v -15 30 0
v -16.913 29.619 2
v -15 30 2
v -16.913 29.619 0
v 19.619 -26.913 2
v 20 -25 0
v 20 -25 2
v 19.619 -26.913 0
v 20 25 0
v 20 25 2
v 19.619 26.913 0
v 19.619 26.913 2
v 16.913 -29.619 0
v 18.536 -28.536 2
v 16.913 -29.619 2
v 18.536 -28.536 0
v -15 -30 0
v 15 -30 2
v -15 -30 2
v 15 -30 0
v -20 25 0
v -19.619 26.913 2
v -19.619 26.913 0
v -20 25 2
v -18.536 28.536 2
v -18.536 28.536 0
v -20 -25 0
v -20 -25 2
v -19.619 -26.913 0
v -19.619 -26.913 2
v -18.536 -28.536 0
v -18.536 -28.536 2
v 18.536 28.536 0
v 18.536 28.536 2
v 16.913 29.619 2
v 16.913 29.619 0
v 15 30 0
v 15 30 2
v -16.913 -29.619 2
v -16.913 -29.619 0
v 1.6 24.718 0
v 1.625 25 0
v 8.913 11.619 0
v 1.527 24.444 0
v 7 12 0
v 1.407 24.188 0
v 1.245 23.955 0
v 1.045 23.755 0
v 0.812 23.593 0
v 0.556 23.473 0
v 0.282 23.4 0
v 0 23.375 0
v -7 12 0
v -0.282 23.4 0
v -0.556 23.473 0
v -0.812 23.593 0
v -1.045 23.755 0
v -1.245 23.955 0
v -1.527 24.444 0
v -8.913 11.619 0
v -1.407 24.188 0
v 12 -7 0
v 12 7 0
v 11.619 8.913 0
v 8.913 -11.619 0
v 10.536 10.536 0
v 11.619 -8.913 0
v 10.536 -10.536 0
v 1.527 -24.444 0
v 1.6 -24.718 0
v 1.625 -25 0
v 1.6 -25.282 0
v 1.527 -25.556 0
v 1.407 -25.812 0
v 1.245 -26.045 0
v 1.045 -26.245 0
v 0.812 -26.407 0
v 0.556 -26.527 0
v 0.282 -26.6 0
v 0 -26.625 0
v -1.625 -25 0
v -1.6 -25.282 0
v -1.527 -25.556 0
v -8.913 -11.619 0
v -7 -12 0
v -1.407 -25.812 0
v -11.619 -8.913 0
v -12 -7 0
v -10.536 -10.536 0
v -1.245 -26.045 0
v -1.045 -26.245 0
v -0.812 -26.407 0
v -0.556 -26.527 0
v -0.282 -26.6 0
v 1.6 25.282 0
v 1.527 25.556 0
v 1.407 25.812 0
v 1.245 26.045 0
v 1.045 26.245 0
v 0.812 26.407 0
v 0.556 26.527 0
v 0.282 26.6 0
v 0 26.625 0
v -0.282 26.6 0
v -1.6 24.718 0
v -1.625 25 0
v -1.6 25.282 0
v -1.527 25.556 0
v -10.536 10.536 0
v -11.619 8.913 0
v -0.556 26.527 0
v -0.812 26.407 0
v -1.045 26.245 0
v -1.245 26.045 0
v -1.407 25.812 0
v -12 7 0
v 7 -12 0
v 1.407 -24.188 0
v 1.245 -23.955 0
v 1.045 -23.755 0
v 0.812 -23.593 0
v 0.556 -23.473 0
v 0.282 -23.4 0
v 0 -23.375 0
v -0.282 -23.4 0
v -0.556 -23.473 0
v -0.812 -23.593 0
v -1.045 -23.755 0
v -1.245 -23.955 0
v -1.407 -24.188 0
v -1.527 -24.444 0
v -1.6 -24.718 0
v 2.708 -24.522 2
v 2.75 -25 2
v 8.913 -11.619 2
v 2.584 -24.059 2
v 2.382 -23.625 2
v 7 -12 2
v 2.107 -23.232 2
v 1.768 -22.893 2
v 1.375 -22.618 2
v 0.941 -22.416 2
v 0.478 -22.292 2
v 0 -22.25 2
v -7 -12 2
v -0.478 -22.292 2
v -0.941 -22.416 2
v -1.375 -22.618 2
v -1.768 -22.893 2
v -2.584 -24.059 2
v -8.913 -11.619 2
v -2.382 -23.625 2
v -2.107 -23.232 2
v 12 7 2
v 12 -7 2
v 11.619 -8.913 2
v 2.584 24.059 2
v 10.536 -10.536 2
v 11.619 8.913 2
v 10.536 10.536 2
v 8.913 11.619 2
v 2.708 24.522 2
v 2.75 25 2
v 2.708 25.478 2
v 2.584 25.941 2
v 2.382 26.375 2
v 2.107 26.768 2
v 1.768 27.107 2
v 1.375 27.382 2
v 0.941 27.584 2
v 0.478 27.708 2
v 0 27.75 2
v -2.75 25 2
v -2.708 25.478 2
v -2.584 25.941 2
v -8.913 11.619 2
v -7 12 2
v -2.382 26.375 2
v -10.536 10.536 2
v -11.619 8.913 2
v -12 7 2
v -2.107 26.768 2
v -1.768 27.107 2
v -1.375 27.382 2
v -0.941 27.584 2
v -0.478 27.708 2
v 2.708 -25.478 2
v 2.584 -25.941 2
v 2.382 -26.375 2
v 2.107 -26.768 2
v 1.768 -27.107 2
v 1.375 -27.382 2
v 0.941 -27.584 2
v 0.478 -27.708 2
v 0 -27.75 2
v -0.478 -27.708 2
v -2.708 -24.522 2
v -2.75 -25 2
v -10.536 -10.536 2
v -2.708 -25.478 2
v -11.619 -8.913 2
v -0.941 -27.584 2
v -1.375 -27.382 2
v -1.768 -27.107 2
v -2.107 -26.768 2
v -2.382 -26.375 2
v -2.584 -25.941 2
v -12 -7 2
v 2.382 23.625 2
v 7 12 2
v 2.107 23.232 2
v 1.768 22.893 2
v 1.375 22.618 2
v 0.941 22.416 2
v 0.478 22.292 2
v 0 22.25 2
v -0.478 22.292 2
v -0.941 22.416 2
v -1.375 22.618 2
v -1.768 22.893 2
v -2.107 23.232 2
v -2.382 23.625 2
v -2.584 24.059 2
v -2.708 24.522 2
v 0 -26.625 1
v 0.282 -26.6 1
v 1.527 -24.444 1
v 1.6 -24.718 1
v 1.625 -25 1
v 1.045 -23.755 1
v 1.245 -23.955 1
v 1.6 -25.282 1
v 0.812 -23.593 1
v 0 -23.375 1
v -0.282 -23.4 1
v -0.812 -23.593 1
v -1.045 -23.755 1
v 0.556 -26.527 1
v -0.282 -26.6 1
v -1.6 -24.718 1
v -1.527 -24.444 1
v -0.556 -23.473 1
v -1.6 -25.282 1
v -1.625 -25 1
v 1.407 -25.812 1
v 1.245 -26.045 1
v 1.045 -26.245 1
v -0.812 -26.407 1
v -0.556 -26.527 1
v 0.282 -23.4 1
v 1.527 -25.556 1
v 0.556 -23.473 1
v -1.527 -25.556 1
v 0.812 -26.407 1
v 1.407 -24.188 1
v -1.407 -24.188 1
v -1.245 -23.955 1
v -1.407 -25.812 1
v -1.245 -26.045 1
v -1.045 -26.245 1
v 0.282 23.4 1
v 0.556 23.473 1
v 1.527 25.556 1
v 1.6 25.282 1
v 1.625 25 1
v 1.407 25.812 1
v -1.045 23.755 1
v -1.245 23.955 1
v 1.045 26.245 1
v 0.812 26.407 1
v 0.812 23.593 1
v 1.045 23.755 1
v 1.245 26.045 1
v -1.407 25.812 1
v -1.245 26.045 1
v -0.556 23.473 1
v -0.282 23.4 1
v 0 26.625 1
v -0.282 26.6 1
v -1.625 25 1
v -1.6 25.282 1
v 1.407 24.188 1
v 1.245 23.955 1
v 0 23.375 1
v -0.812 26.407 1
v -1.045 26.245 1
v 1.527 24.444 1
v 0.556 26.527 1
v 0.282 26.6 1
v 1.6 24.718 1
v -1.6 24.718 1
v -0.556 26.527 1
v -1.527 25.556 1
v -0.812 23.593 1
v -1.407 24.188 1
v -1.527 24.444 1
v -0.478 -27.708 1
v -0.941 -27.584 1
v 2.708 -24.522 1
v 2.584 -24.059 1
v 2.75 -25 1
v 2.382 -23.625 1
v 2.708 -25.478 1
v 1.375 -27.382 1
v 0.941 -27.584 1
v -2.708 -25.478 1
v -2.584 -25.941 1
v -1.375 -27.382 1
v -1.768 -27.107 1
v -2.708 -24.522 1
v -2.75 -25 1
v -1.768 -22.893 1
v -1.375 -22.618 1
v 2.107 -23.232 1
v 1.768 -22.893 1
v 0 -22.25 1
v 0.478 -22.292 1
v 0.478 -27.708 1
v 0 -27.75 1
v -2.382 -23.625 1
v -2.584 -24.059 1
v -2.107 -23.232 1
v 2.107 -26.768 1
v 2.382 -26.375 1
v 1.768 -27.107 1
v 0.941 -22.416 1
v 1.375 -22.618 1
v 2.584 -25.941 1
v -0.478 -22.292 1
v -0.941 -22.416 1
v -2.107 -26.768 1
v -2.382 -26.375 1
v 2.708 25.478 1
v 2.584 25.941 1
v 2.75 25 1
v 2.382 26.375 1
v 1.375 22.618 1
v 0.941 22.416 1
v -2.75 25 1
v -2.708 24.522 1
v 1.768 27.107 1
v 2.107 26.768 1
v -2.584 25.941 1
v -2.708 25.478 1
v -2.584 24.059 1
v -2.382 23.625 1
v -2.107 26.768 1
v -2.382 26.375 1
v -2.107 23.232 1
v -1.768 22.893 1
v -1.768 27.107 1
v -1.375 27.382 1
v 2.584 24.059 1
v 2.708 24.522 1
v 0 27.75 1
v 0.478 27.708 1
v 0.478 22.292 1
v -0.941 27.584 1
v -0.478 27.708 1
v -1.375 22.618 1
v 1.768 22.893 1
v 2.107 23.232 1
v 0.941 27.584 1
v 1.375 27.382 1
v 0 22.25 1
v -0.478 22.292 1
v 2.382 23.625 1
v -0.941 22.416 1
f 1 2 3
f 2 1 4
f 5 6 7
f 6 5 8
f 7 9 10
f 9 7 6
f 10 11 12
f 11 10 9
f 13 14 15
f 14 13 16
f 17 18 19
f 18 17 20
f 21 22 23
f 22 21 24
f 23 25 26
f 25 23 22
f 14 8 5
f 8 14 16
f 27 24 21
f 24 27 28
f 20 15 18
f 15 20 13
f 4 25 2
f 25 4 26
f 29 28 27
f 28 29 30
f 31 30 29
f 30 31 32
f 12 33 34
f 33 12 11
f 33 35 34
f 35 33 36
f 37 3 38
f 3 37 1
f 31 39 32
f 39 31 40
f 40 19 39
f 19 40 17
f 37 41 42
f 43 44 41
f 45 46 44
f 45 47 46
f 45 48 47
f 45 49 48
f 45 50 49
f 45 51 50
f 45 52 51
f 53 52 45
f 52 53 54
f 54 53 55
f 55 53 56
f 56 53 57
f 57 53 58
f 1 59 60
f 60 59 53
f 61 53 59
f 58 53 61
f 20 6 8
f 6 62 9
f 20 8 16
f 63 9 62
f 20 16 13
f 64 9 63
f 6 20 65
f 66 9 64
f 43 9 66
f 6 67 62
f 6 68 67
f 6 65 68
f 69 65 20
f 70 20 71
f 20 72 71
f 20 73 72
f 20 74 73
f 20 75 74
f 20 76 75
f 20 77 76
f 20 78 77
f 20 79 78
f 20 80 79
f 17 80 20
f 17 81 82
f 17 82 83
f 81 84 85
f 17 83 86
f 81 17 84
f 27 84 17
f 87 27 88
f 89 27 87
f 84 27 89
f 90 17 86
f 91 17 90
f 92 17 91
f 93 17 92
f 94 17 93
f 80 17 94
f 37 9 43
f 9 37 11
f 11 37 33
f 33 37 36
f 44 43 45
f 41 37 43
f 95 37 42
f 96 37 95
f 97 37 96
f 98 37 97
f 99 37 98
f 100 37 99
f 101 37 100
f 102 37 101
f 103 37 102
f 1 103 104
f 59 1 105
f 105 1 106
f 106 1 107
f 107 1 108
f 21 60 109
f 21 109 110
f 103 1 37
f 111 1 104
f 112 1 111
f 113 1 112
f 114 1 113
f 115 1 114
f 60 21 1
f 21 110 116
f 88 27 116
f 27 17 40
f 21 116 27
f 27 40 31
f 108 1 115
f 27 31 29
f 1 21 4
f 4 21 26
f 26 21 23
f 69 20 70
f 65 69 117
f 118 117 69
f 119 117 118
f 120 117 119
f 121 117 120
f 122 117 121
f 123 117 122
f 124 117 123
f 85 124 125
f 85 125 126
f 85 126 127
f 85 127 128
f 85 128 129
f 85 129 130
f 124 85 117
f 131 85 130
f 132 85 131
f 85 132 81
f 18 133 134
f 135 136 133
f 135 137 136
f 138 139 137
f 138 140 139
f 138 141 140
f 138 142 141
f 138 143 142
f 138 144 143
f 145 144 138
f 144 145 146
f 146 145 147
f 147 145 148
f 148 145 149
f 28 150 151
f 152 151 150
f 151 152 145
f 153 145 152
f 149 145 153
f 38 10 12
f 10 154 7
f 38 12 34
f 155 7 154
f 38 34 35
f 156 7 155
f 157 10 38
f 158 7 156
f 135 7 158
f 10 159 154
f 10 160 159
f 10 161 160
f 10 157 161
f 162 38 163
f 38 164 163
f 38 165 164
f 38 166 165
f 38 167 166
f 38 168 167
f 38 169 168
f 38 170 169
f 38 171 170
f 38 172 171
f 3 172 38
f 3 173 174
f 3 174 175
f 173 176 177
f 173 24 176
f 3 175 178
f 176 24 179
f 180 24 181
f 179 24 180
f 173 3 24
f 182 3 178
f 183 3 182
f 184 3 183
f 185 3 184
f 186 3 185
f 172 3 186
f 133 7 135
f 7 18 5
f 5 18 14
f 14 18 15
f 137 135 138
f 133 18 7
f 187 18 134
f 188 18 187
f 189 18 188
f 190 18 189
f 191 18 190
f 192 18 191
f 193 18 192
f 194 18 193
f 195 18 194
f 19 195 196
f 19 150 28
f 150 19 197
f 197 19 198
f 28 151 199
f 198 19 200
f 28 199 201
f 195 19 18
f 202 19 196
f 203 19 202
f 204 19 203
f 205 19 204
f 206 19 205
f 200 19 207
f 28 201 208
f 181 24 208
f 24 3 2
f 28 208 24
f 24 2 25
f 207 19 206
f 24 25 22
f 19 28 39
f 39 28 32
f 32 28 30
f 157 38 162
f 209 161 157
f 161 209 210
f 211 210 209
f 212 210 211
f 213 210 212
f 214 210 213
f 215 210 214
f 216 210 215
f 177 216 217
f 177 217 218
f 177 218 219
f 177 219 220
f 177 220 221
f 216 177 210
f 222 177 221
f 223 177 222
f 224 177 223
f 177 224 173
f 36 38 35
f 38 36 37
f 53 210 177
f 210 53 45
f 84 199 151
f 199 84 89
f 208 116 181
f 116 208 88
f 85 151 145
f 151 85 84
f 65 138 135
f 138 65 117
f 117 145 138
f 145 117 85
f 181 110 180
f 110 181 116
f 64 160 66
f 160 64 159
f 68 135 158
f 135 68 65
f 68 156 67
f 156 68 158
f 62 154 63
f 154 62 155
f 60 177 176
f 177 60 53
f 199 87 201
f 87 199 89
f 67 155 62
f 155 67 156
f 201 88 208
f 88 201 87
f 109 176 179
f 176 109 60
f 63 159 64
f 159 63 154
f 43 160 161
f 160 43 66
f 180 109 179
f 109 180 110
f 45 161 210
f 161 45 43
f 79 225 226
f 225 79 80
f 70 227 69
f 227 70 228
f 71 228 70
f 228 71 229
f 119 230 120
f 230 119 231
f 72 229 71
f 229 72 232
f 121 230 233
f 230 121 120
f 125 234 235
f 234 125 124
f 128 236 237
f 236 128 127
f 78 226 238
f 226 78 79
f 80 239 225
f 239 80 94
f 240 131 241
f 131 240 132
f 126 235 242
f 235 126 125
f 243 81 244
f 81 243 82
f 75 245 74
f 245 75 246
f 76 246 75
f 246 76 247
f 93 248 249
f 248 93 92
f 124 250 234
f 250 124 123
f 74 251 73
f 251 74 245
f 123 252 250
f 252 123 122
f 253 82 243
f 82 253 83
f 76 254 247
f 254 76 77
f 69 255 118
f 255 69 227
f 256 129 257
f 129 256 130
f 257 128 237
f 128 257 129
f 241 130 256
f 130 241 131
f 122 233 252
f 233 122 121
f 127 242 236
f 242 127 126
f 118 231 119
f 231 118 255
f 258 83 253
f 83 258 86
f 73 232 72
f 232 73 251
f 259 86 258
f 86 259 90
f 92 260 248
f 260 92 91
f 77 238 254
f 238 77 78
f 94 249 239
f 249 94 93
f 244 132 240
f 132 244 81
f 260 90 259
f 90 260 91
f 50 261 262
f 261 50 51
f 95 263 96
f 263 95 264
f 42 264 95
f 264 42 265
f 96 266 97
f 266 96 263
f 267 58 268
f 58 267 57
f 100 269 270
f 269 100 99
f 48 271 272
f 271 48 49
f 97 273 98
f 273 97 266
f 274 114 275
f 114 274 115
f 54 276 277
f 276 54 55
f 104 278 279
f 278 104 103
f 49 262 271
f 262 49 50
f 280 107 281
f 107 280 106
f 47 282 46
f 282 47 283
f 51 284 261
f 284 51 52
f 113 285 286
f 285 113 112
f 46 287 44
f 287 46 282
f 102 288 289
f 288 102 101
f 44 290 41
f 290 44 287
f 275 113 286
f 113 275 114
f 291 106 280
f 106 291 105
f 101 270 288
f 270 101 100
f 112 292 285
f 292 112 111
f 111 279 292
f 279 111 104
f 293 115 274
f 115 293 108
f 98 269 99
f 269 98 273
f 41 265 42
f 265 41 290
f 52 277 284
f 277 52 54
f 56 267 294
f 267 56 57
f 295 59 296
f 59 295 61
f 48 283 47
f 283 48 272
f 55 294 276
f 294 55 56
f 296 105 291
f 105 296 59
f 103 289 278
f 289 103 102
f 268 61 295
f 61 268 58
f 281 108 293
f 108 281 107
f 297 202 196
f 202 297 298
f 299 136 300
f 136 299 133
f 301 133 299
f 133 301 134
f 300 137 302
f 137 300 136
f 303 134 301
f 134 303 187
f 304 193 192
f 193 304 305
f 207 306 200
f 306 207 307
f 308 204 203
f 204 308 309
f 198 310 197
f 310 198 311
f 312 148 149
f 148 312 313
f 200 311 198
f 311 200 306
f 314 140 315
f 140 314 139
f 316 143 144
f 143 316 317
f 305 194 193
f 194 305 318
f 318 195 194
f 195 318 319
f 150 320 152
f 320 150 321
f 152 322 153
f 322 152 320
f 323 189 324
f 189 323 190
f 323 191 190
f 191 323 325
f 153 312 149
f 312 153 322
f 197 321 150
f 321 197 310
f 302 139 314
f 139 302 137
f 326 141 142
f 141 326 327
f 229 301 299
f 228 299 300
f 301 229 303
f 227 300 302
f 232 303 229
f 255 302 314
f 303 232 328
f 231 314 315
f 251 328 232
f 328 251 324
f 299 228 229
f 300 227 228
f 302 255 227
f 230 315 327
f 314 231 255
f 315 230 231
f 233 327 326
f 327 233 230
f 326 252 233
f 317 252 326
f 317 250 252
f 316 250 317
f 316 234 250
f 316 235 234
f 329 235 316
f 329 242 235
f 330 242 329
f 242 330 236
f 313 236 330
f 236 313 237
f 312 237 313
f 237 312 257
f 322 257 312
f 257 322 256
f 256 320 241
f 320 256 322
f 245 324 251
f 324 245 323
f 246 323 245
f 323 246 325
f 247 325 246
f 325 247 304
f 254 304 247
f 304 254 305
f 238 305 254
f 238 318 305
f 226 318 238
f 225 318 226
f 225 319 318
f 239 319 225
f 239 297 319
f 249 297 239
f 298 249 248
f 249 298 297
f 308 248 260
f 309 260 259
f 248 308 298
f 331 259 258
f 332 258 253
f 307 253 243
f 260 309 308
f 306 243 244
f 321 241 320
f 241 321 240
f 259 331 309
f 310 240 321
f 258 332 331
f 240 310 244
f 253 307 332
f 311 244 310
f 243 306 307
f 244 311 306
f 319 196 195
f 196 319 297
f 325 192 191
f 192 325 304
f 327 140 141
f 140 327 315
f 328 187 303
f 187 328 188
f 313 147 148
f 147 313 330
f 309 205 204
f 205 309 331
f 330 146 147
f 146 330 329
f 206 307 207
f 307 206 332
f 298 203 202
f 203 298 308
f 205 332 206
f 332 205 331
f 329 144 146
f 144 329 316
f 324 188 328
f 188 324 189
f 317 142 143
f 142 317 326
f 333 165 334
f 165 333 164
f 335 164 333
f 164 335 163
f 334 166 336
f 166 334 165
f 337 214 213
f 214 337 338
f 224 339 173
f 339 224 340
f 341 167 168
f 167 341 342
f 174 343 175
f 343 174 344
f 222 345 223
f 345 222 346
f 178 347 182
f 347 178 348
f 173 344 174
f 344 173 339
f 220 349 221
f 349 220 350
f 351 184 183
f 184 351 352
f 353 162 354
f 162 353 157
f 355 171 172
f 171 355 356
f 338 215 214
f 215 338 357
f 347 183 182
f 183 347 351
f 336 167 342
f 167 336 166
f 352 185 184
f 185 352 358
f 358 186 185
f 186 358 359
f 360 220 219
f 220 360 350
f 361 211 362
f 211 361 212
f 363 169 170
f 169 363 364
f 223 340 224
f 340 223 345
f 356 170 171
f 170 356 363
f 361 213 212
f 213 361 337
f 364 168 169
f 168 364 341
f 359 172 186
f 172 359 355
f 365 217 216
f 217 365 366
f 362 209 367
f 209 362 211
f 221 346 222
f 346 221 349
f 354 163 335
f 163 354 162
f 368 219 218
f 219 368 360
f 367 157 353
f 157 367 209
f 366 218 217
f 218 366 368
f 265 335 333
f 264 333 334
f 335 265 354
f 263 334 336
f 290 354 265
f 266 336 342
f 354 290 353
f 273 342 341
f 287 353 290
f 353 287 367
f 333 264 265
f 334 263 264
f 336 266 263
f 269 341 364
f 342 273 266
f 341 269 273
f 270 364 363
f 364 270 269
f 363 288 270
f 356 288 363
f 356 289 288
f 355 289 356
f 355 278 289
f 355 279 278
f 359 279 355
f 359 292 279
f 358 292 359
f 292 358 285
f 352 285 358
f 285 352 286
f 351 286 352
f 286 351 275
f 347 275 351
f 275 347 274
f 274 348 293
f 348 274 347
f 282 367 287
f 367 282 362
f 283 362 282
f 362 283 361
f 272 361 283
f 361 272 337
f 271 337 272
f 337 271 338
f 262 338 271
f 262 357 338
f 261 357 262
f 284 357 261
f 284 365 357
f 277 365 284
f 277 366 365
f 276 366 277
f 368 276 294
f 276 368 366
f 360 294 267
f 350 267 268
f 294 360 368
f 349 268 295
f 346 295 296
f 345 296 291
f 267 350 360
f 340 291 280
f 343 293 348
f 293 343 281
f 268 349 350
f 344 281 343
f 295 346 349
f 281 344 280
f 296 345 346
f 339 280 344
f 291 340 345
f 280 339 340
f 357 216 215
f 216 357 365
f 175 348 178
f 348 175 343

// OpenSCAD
/*
 * Machdyne PNP
 * Copyright (c) 2023 Lone Dynamics Corporation. All rights reserved.
 *
 * Up-Facing Camera Mount
 *
 */

//ufcm();
ufcmfp();

module ufcmfp() {
		difference() {
		
		union() {
			translate([-40/2,-60/2,0]) roundedcube(40,60,2,5);

		}

		translate([-24/2,-24/2,-5]) roundedcube(24,24,10,5);
		
		translate([0,-25,-5]) cylinder(d=3.25, h=50, $fn=36);
		translate([0,25,-5]) cylinder(d=3.25, h=50, $fn=36);

		translate([0,-25,1]) cylinder(d=5.5, h=50, $fn=36);
		translate([0,25,1]) cylinder(d=5.5, h=50, $fn=36);
		
	}
}

module ufcm() {

//	translate([0,0,-18+3]) color([1.0,0,0]) cube([30,25,1], center=true);
	
	difference(){
		union() {
			translate([0,13.25,-16.5]) color([0,1.0,0]) cube([33,4,3], center=true);
			translate([12,11.5,-16.5]) color([1.0,1.0,0]) cube([4.5,3,3], center=true);
			translate([-12,11.5,-16.5]) color([1.0,1.0,0]) cube([4.5,3,3], center=true);
		}
		translate([-12,-12.5,-30]) cylinder(d=3.25, h=25, $fn=36);
		translate([12,-12.5,-30]) cylinder(d=3.25, h=25, $fn=36);
		translate([-12,12.5,-30]) cylinder(d=3.25, h=25, $fn=36);
		translate([12,12.5,-30]) cylinder(d=3.25, h=25, $fn=36);
	}
	
	difference() {
		
		union() {
			translate([-60/2,-60/2,0]) roundedcube(60,60,2,5);
			translate([-35/2,-35/2,-20]) roundedcube(35,35,20,5);
	
		}

		translate([0,-35/2+2,-10]) cube([30.5,70,16], center=true);
		translate([0,0,0]) cylinder(d=30, h=5, center=true);

		translate([-12,-12.5,-30]) cylinder(d=3.25, h=15, $fn=36);
		translate([12,-12.5,-30]) cylinder(d=3.25, h=15, $fn=36);
		translate([-12,12.5,-30]) cylinder(d=3.25, h=15, $fn=36);
		translate([12,12.5,-30]) cylinder(d=3.25, h=15, $fn=36);

		translate([-12,-12.5,-3]) cylinder(d=10, h=20, $fn=36);
		translate([12,-12.5,-3]) cylinder(d=10, h=15, $fn=36);
		translate([-12,12.5,-3]) cylinder(d=10, h=15, $fn=36);
		translate([12,12.5,-3]) cylinder(d=10, h=15, $fn=36);

		
		translate([-25,0,-5]) cylinder(d=3.25, h=50, $fn=36);
		translate([25,0,-5]) cylinder(d=3.25, h=50, $fn=36);
		translate([0,-25,-5]) cylinder(d=3.25, h=50, $fn=36);
		translate([0,25,-5]) cylinder(d=3.25, h=50, $fn=36);
		
	}
		
}

module roundedcube(xx, yy, height, radius)
{
    translate([0,0,height/2])
    hull()
    {
        translate([radius,radius,0])
        cylinder(height,radius,radius,true);

        translate([xx-radius,radius,0])
        cylinder(height,radius,radius,true);

        translate([xx-radius,yy-radius,0])
        cylinder(height,radius,radius,true);

        translate([radius,yy-radius,0])
        cylinder(height,radius,radius,true);
    }
}
